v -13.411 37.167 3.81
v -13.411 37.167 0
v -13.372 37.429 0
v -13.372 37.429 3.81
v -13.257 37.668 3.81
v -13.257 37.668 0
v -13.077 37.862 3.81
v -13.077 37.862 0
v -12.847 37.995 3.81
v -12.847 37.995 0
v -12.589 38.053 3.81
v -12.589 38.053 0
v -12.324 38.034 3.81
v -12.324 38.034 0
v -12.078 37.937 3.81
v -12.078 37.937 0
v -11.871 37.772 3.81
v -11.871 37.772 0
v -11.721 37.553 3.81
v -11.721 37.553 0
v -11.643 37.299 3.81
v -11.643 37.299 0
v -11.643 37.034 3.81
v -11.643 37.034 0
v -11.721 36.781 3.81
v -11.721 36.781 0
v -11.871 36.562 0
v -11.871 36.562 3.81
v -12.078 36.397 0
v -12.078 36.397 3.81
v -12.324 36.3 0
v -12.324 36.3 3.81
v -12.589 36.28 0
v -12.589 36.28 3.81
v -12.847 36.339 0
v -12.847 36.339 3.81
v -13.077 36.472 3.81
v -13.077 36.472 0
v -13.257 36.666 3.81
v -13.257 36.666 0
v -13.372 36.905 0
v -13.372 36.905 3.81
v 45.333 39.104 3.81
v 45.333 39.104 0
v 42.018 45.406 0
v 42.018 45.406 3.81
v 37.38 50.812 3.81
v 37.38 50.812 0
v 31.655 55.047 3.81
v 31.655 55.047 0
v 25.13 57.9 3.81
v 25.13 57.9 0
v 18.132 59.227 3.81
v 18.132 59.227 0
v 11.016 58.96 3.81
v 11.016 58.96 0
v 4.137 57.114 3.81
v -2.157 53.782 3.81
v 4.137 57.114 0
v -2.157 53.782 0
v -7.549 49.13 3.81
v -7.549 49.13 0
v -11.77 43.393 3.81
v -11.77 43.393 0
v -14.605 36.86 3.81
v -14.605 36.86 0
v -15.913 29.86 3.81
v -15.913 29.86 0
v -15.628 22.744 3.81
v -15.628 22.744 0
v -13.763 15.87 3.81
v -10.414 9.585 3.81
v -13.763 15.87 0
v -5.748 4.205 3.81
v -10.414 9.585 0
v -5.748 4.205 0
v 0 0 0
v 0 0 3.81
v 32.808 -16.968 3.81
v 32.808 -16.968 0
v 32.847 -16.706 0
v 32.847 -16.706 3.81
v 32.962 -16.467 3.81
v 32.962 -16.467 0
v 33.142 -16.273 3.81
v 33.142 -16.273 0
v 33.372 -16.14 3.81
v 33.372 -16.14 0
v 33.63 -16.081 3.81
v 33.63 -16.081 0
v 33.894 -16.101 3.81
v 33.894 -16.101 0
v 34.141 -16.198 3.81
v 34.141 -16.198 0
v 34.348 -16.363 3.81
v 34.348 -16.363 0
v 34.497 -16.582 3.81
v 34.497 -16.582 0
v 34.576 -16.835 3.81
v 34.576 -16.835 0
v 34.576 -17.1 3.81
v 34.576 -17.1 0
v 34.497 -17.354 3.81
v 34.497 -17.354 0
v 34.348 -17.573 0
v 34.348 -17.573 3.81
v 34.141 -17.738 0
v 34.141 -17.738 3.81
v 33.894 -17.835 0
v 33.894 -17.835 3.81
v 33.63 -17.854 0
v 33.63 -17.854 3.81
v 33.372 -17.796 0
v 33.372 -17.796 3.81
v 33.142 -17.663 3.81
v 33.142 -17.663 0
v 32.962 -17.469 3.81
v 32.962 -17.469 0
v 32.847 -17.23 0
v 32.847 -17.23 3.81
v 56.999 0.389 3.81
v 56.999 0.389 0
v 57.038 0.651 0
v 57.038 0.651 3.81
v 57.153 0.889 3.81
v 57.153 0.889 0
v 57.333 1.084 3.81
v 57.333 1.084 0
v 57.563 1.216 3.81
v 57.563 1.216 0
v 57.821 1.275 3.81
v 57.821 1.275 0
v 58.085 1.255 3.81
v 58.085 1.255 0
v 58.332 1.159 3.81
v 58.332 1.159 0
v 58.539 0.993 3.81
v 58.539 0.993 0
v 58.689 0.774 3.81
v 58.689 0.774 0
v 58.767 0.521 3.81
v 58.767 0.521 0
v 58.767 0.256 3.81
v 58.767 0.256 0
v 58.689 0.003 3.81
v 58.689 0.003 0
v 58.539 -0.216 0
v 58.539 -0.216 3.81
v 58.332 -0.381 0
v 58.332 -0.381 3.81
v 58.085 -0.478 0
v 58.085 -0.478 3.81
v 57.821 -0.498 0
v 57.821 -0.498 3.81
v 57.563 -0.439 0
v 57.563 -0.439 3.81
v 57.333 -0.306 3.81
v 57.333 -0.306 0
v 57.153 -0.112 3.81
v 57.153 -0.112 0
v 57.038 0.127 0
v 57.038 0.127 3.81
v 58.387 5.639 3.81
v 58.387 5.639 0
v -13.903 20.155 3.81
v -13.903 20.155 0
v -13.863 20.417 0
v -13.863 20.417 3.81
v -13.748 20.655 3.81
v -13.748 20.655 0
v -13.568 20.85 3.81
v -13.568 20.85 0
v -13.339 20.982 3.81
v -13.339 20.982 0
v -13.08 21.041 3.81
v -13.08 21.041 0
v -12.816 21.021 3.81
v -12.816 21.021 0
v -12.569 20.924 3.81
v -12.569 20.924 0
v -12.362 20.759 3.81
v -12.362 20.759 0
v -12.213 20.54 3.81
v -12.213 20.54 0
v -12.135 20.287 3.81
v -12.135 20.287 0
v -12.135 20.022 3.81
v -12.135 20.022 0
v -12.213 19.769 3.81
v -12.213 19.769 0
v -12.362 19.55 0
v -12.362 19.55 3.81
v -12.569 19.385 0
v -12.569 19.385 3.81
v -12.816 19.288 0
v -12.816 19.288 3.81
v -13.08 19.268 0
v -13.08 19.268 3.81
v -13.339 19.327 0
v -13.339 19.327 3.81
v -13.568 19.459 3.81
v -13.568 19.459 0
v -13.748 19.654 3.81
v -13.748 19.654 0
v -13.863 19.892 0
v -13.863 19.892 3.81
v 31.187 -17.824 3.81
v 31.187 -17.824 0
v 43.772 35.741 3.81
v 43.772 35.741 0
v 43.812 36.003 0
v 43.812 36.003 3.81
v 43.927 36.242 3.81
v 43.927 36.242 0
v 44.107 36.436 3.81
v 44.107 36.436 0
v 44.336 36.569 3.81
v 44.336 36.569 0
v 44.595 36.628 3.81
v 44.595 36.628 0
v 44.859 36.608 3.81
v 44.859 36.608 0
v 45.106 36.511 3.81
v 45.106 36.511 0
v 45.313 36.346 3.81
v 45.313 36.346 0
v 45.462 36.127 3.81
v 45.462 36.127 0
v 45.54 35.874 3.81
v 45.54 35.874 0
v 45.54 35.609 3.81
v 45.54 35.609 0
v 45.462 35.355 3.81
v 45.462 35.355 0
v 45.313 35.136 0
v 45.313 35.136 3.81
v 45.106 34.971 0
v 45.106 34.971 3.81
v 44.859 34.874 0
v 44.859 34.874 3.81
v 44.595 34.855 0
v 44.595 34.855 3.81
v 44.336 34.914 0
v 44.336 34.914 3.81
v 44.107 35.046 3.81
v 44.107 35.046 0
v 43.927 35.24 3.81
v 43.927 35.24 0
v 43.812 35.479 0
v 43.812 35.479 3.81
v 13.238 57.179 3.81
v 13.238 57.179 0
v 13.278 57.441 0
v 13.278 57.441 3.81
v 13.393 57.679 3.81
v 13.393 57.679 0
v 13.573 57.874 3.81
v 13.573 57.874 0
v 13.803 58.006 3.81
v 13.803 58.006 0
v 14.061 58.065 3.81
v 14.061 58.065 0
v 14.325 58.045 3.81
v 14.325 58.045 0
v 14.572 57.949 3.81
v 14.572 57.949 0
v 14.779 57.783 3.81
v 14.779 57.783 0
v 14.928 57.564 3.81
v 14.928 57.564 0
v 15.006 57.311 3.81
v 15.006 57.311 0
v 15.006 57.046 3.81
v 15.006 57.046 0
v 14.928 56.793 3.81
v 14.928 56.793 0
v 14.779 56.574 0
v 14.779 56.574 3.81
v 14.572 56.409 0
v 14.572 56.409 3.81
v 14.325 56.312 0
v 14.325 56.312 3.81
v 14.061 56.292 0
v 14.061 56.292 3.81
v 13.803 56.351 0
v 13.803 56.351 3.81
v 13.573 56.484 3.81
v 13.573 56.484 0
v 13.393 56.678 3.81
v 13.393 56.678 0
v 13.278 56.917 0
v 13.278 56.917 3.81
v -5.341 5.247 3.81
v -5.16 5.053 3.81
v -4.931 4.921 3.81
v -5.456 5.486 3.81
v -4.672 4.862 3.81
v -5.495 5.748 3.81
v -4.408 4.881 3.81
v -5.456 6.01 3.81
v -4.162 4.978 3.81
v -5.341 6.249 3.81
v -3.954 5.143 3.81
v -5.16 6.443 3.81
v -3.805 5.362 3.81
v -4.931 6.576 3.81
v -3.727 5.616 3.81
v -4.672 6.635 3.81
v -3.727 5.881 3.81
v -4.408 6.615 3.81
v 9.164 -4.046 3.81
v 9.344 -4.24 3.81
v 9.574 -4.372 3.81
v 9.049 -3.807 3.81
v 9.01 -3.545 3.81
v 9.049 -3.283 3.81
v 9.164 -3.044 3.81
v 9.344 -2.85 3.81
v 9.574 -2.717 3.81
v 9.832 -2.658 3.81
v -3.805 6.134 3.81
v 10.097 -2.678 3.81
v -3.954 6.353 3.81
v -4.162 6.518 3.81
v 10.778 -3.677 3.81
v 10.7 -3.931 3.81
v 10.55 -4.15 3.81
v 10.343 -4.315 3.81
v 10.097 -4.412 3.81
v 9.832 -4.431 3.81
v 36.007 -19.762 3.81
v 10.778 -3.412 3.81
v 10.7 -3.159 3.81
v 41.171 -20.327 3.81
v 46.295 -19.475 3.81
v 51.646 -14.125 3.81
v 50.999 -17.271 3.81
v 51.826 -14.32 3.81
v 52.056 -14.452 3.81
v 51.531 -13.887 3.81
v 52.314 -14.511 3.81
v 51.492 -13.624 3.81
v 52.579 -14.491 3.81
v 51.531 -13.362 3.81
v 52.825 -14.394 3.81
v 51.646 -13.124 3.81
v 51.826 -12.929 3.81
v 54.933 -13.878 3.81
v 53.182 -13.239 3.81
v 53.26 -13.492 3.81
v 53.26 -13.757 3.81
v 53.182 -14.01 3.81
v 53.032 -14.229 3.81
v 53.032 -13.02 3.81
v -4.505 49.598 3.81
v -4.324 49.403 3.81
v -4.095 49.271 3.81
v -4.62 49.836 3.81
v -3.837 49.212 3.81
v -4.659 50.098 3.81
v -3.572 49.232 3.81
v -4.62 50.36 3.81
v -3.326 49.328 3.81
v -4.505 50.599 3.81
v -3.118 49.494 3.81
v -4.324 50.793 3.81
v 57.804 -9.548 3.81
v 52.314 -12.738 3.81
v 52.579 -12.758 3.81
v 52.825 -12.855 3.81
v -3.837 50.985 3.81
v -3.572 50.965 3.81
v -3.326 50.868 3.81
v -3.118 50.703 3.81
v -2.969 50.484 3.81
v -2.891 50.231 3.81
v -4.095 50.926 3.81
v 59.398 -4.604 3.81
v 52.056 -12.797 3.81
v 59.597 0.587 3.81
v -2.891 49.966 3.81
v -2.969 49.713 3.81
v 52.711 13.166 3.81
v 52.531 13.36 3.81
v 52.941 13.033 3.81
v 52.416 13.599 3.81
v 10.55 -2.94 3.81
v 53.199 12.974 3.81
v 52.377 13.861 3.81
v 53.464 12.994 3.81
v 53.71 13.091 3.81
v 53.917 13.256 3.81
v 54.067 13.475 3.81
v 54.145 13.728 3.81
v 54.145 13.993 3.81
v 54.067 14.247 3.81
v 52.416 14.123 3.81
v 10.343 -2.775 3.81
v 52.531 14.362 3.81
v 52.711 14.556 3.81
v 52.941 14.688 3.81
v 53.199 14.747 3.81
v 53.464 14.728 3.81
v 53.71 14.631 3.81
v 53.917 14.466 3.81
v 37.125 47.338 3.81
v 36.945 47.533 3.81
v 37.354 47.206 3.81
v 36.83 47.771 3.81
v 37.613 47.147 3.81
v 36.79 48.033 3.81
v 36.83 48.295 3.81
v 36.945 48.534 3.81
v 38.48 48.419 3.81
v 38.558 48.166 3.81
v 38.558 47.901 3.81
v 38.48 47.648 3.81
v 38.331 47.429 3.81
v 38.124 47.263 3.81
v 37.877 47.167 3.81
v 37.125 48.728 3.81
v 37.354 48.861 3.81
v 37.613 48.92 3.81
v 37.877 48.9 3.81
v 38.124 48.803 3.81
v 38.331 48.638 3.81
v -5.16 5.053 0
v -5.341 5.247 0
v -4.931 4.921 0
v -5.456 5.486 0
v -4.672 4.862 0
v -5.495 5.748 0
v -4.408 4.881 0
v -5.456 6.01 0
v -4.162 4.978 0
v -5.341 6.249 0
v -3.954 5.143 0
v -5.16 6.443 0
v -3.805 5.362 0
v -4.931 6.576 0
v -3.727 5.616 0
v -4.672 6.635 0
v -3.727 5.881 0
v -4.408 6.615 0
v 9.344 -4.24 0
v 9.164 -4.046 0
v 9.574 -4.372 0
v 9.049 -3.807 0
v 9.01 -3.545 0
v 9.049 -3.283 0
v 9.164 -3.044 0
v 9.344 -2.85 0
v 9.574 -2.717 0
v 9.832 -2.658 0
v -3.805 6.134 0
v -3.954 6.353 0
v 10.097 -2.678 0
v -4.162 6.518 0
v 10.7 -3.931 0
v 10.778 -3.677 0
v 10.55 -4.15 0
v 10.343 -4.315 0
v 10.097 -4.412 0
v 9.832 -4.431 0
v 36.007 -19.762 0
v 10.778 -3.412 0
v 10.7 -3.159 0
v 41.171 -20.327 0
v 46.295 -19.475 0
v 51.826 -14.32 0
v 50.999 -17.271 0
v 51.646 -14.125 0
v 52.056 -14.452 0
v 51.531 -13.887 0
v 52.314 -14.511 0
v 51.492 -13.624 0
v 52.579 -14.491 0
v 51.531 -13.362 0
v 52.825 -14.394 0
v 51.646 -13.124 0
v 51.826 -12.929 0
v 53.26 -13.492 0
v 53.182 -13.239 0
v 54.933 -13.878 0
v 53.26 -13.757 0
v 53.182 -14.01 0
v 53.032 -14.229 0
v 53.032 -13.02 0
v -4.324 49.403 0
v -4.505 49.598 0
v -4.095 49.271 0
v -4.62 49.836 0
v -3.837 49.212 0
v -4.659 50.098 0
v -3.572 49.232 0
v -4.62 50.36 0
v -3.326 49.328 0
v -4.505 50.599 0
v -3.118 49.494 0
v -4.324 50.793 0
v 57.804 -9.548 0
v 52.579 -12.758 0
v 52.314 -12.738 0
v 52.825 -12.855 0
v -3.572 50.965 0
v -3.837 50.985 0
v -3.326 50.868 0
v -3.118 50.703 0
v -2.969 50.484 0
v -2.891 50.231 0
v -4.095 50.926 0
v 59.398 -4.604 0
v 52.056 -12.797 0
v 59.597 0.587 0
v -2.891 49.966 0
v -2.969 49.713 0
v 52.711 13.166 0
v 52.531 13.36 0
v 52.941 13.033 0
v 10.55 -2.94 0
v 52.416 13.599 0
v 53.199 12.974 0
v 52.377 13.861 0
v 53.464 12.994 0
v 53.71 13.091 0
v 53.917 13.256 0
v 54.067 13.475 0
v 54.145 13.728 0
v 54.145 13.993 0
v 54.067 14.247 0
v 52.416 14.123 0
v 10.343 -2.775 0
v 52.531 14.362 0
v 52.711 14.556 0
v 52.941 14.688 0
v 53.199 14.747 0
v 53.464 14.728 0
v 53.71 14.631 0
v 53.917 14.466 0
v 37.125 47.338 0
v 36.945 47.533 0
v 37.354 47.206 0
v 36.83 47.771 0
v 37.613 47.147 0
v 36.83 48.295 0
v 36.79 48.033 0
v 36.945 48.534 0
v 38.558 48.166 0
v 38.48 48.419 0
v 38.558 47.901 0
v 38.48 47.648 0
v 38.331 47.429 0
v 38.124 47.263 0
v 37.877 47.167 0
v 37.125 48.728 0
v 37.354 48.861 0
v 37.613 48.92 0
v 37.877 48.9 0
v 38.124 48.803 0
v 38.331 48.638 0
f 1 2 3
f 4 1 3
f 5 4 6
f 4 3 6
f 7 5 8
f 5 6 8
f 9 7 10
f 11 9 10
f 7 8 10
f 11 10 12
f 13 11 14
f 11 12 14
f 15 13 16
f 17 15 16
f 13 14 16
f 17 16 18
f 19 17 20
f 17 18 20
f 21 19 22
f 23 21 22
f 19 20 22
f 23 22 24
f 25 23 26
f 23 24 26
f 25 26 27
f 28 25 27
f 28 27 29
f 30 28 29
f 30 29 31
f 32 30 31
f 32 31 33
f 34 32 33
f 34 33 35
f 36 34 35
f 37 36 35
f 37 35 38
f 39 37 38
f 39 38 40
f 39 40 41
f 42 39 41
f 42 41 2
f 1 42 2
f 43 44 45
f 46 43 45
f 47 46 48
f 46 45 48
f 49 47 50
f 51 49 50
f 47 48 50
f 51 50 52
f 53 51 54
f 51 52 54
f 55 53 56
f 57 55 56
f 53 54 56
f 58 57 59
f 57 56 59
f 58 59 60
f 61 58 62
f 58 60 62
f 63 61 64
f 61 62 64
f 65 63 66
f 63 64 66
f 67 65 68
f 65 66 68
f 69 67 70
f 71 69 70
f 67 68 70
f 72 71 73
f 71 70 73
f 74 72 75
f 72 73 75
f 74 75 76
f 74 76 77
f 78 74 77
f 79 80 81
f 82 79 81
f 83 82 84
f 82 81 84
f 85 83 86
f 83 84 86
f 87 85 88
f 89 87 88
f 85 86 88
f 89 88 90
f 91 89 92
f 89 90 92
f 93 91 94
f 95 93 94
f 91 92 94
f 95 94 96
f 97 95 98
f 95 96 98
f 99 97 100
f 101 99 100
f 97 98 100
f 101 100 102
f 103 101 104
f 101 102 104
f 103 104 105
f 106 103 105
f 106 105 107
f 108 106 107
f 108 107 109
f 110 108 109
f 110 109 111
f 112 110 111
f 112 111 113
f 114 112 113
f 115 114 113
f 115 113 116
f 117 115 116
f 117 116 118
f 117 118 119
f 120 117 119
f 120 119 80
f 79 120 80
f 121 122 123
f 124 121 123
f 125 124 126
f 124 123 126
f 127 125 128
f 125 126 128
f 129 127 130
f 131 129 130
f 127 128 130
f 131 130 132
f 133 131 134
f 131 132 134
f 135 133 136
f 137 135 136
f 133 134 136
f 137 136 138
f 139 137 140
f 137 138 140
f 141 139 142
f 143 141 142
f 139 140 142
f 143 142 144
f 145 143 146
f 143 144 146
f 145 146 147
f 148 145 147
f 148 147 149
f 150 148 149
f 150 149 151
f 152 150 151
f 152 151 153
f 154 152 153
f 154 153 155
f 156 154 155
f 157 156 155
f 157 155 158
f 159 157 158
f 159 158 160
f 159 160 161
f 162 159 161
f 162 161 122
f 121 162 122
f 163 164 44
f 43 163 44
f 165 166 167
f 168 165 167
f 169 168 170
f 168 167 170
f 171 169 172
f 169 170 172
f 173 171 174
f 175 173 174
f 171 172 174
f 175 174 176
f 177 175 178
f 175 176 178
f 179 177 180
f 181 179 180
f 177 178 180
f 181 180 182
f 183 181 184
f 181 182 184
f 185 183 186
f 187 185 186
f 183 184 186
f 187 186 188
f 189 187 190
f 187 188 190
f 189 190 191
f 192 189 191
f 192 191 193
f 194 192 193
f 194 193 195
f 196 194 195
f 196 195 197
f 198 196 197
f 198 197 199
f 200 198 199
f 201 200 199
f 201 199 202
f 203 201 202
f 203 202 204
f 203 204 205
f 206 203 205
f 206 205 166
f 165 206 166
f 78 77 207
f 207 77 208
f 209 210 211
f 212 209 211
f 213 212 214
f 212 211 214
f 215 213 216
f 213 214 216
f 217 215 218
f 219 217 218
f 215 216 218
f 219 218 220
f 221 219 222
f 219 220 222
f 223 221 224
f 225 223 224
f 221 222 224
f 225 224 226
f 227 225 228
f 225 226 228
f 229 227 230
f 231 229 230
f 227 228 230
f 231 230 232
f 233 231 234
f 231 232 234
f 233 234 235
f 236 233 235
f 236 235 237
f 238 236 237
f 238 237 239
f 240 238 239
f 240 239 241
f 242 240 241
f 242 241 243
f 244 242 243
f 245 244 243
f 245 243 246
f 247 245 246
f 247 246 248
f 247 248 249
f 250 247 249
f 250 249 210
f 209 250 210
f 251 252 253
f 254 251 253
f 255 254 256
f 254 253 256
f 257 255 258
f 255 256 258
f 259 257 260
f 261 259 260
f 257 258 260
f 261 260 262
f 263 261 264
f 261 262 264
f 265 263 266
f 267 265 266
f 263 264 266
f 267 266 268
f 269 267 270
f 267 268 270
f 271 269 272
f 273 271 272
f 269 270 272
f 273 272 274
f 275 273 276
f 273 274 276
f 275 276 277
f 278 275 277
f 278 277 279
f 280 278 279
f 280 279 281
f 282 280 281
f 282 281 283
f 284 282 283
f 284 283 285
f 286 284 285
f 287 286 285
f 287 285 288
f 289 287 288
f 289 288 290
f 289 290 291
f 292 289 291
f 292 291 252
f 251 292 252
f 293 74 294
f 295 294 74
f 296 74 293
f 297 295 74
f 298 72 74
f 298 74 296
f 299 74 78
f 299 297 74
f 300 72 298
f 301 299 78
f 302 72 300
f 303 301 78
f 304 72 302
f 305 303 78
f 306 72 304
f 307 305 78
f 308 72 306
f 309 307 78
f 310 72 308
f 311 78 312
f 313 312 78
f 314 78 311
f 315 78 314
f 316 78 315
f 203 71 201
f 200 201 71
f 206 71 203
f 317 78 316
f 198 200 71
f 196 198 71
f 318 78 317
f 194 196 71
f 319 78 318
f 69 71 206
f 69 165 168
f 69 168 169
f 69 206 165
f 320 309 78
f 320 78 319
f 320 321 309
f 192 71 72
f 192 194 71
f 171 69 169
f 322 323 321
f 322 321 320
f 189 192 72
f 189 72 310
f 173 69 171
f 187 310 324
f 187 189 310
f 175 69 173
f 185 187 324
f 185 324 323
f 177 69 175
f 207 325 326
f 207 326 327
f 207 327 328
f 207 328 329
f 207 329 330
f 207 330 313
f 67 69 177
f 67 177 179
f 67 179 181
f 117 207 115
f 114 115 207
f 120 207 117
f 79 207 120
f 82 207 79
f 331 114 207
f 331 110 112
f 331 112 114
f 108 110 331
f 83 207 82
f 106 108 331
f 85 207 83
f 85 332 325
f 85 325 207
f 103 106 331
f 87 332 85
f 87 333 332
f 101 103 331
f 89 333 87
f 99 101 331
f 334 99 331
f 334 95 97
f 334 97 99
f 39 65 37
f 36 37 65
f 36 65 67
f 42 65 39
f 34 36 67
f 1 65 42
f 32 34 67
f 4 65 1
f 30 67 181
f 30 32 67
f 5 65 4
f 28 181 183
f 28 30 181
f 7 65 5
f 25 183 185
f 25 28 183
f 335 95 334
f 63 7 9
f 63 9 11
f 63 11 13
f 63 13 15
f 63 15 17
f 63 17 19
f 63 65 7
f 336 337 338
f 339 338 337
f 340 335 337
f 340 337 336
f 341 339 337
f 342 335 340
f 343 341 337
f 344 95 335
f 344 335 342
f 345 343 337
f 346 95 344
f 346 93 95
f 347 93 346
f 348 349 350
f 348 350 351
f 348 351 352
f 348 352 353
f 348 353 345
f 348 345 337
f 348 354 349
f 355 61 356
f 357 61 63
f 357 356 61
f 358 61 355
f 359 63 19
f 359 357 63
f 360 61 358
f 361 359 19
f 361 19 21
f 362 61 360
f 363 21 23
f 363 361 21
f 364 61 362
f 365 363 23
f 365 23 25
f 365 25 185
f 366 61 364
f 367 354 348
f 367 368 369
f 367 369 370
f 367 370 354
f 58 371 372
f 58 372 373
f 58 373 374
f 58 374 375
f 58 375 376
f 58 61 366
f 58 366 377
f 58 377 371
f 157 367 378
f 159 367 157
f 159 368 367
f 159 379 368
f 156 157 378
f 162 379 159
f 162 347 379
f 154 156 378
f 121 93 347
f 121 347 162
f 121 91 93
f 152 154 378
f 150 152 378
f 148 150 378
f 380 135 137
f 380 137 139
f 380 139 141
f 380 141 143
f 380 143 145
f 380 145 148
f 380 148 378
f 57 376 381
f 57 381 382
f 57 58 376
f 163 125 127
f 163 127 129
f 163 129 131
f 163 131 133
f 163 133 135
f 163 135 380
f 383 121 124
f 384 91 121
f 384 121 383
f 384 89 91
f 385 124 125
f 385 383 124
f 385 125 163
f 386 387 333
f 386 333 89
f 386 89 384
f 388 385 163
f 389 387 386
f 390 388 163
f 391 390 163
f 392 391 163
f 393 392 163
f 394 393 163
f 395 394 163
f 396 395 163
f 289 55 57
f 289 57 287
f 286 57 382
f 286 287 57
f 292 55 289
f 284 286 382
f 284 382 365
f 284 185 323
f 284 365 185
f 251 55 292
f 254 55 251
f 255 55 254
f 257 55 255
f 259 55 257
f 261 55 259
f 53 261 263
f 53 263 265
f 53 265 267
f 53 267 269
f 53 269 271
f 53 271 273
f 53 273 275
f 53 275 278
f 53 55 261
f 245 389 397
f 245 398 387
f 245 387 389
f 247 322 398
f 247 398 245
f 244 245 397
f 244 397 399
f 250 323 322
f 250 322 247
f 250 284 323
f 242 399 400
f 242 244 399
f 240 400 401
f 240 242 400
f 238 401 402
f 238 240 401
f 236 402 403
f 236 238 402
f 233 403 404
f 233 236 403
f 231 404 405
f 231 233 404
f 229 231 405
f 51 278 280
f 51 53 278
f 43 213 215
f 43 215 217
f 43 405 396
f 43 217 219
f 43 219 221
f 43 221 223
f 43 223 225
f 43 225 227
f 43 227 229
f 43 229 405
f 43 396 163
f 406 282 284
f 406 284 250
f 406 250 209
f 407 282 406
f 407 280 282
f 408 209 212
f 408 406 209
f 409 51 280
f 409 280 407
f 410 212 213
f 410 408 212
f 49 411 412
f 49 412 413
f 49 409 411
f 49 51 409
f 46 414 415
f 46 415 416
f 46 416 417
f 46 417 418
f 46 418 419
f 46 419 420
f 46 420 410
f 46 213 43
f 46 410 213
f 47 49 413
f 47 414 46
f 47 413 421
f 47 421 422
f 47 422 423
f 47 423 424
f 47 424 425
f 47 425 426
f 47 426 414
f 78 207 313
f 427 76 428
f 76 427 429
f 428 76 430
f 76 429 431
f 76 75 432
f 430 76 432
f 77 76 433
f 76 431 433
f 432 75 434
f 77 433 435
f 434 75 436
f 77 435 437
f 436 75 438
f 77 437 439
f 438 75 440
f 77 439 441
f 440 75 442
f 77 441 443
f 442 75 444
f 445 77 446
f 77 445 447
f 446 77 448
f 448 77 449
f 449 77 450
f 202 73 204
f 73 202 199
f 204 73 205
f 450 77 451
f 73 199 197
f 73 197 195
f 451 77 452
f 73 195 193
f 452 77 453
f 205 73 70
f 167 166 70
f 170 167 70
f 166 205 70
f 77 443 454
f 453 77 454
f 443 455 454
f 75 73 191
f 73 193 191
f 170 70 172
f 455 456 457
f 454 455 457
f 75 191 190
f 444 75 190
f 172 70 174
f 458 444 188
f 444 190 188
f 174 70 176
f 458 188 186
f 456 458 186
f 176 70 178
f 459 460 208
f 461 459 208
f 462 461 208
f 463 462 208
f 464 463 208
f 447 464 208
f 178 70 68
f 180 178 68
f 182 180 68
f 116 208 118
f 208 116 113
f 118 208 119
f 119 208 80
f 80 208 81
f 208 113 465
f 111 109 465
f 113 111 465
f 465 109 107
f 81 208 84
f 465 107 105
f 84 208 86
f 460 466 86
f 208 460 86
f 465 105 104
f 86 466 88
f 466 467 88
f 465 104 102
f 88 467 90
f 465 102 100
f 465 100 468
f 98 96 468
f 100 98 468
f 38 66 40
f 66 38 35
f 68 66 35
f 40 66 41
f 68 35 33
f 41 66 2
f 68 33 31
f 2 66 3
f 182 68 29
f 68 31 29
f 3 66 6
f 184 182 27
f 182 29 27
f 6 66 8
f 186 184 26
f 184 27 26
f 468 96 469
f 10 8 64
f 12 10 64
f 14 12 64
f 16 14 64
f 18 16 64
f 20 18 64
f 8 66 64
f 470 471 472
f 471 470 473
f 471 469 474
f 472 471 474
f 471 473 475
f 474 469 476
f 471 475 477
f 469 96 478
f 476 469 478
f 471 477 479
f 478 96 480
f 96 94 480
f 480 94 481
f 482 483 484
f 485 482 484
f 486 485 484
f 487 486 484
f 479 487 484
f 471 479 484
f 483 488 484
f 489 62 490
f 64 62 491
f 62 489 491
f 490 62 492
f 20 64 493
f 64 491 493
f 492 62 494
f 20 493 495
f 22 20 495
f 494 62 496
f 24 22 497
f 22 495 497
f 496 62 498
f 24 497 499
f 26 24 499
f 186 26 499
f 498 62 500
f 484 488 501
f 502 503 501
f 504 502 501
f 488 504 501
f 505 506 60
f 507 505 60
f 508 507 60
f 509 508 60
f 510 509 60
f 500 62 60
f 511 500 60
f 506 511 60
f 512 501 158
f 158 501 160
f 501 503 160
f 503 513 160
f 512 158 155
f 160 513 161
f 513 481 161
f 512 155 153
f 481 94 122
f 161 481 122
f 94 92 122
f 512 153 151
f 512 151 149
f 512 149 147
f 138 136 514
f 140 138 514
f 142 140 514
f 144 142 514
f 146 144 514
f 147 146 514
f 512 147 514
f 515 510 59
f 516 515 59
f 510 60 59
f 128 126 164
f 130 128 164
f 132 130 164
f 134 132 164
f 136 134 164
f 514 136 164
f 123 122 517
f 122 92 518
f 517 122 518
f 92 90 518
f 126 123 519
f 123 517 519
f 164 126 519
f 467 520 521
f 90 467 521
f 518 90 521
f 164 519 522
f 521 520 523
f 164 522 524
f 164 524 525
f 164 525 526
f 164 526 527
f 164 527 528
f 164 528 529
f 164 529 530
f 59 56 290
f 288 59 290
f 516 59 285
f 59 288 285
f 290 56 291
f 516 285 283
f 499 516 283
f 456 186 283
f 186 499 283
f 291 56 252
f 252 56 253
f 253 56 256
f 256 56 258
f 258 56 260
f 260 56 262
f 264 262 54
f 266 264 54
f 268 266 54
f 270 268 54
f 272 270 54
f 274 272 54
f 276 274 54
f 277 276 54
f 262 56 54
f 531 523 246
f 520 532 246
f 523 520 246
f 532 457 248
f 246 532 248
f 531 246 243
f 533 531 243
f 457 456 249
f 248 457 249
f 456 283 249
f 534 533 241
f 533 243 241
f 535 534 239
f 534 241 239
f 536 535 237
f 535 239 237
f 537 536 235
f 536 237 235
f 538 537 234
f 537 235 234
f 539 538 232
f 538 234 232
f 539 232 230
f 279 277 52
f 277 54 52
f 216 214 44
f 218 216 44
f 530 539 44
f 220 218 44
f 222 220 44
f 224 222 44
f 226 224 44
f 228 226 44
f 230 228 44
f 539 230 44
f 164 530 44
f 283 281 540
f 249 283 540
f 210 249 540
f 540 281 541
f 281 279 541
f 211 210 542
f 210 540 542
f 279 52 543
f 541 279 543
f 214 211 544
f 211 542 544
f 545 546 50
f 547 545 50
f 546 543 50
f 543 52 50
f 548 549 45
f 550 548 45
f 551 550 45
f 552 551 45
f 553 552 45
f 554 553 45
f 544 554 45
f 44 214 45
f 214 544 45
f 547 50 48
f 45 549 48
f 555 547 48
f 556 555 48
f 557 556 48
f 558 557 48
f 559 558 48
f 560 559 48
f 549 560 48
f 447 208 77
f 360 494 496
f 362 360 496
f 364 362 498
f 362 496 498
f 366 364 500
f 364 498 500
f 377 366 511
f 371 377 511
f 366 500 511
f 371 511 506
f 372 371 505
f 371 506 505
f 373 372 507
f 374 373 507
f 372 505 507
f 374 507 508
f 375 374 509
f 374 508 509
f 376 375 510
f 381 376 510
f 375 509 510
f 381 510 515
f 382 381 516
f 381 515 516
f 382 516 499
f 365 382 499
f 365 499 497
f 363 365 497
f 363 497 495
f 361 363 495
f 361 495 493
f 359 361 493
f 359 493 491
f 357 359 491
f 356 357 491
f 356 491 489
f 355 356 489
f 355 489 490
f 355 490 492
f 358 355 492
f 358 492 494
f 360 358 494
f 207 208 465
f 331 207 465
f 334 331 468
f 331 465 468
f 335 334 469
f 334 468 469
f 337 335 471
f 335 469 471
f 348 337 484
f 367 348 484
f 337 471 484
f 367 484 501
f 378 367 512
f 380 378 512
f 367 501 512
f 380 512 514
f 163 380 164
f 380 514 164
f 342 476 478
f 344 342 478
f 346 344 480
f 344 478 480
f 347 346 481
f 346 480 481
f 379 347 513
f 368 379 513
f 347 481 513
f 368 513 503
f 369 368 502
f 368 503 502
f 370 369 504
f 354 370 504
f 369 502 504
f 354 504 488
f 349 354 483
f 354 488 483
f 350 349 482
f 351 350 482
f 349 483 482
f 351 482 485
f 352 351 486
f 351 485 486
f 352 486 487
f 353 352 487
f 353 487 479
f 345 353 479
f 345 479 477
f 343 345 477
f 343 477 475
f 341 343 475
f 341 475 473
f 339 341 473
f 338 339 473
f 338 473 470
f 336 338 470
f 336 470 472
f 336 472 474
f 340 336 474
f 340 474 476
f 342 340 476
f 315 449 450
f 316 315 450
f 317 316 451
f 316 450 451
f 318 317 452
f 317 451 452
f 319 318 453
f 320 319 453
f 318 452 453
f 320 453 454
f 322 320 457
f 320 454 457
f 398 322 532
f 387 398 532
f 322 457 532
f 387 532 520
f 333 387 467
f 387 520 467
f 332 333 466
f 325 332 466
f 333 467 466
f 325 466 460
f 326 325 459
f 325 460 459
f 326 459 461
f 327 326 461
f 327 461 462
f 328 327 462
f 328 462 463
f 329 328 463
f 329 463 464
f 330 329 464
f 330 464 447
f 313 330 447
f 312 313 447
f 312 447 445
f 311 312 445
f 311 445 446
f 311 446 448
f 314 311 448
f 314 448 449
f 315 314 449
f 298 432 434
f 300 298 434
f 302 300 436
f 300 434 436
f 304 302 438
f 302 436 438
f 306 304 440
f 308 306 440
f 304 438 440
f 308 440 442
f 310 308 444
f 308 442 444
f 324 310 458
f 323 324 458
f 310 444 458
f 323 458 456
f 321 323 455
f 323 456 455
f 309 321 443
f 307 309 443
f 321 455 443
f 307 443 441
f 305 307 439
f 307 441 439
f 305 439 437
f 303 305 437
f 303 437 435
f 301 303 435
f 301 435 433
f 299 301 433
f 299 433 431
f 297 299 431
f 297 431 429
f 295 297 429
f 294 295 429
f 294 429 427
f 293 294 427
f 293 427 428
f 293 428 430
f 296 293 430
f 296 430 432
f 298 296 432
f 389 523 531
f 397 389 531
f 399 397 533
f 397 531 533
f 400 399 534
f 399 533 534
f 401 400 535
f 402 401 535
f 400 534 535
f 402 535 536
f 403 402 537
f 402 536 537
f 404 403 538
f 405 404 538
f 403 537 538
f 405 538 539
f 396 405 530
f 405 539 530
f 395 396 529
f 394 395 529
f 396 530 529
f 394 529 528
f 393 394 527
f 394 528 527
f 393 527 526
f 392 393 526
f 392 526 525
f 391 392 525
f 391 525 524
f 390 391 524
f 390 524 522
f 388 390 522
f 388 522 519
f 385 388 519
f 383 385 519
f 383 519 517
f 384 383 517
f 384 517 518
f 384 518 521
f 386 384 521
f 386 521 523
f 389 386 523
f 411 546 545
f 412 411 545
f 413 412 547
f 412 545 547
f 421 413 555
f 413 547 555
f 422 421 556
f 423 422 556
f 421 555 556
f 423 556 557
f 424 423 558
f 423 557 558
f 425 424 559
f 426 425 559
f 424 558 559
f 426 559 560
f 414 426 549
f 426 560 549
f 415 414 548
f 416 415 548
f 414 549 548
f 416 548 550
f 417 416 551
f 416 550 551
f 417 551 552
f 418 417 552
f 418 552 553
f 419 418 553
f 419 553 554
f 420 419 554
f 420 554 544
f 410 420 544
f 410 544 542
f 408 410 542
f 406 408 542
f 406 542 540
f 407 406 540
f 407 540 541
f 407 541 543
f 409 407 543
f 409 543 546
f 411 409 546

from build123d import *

# Parameters (mm, degrees)
BOSS_EXTRUDE1_DEPTH        = 3.81
F_50_0_07_DIAMETER_HOLE3_D = 1.778


with BuildPart() as part:
    # Sketch1 → Boss-Extrude1 (new body)
    with BuildSketch(Plane.XY):
        with BuildLine():
            Line((0, 0), (31.187102024, -17.823710818))
            ThreePointArc((31.187102024, -17.823710818), (53.082286429, -15.709260563), (58.387158413, 5.638534012))
            Line((58.387158413, 5.638534012), (45.333427314, 39.103741383))
            ThreePointArc((45.333427314, 39.103741383), (-4.983807045, 51.60744456), (0, 0))
        make_face()
    extrude(amount=BOSS_EXTRUDE1_DEPTH)

    # #50 (0.07) Diameter Hole3 (through all)
    with Locations(Plane.XY.offset(3.81)):
        with Locations((-3.770169746, 50.098384989), (14.127303317, 57.178704003), (37.679197815, 48.033291943), (57.887608334, 0.388645245), (52.380693545, -13.624486137), (33.69651837, -16.967970116), (9.898779461, -3.544865319), (-4.606040741, 5.748053387), (-13.01391957, 20.154535826), (-12.52223075, 37.166969012), (44.661179065, 35.741071433), (53.265733422, 13.860918924)):
            Hole(F_50_0_07_DIAMETER_HOLE3_D / 2)


solid = part.part
